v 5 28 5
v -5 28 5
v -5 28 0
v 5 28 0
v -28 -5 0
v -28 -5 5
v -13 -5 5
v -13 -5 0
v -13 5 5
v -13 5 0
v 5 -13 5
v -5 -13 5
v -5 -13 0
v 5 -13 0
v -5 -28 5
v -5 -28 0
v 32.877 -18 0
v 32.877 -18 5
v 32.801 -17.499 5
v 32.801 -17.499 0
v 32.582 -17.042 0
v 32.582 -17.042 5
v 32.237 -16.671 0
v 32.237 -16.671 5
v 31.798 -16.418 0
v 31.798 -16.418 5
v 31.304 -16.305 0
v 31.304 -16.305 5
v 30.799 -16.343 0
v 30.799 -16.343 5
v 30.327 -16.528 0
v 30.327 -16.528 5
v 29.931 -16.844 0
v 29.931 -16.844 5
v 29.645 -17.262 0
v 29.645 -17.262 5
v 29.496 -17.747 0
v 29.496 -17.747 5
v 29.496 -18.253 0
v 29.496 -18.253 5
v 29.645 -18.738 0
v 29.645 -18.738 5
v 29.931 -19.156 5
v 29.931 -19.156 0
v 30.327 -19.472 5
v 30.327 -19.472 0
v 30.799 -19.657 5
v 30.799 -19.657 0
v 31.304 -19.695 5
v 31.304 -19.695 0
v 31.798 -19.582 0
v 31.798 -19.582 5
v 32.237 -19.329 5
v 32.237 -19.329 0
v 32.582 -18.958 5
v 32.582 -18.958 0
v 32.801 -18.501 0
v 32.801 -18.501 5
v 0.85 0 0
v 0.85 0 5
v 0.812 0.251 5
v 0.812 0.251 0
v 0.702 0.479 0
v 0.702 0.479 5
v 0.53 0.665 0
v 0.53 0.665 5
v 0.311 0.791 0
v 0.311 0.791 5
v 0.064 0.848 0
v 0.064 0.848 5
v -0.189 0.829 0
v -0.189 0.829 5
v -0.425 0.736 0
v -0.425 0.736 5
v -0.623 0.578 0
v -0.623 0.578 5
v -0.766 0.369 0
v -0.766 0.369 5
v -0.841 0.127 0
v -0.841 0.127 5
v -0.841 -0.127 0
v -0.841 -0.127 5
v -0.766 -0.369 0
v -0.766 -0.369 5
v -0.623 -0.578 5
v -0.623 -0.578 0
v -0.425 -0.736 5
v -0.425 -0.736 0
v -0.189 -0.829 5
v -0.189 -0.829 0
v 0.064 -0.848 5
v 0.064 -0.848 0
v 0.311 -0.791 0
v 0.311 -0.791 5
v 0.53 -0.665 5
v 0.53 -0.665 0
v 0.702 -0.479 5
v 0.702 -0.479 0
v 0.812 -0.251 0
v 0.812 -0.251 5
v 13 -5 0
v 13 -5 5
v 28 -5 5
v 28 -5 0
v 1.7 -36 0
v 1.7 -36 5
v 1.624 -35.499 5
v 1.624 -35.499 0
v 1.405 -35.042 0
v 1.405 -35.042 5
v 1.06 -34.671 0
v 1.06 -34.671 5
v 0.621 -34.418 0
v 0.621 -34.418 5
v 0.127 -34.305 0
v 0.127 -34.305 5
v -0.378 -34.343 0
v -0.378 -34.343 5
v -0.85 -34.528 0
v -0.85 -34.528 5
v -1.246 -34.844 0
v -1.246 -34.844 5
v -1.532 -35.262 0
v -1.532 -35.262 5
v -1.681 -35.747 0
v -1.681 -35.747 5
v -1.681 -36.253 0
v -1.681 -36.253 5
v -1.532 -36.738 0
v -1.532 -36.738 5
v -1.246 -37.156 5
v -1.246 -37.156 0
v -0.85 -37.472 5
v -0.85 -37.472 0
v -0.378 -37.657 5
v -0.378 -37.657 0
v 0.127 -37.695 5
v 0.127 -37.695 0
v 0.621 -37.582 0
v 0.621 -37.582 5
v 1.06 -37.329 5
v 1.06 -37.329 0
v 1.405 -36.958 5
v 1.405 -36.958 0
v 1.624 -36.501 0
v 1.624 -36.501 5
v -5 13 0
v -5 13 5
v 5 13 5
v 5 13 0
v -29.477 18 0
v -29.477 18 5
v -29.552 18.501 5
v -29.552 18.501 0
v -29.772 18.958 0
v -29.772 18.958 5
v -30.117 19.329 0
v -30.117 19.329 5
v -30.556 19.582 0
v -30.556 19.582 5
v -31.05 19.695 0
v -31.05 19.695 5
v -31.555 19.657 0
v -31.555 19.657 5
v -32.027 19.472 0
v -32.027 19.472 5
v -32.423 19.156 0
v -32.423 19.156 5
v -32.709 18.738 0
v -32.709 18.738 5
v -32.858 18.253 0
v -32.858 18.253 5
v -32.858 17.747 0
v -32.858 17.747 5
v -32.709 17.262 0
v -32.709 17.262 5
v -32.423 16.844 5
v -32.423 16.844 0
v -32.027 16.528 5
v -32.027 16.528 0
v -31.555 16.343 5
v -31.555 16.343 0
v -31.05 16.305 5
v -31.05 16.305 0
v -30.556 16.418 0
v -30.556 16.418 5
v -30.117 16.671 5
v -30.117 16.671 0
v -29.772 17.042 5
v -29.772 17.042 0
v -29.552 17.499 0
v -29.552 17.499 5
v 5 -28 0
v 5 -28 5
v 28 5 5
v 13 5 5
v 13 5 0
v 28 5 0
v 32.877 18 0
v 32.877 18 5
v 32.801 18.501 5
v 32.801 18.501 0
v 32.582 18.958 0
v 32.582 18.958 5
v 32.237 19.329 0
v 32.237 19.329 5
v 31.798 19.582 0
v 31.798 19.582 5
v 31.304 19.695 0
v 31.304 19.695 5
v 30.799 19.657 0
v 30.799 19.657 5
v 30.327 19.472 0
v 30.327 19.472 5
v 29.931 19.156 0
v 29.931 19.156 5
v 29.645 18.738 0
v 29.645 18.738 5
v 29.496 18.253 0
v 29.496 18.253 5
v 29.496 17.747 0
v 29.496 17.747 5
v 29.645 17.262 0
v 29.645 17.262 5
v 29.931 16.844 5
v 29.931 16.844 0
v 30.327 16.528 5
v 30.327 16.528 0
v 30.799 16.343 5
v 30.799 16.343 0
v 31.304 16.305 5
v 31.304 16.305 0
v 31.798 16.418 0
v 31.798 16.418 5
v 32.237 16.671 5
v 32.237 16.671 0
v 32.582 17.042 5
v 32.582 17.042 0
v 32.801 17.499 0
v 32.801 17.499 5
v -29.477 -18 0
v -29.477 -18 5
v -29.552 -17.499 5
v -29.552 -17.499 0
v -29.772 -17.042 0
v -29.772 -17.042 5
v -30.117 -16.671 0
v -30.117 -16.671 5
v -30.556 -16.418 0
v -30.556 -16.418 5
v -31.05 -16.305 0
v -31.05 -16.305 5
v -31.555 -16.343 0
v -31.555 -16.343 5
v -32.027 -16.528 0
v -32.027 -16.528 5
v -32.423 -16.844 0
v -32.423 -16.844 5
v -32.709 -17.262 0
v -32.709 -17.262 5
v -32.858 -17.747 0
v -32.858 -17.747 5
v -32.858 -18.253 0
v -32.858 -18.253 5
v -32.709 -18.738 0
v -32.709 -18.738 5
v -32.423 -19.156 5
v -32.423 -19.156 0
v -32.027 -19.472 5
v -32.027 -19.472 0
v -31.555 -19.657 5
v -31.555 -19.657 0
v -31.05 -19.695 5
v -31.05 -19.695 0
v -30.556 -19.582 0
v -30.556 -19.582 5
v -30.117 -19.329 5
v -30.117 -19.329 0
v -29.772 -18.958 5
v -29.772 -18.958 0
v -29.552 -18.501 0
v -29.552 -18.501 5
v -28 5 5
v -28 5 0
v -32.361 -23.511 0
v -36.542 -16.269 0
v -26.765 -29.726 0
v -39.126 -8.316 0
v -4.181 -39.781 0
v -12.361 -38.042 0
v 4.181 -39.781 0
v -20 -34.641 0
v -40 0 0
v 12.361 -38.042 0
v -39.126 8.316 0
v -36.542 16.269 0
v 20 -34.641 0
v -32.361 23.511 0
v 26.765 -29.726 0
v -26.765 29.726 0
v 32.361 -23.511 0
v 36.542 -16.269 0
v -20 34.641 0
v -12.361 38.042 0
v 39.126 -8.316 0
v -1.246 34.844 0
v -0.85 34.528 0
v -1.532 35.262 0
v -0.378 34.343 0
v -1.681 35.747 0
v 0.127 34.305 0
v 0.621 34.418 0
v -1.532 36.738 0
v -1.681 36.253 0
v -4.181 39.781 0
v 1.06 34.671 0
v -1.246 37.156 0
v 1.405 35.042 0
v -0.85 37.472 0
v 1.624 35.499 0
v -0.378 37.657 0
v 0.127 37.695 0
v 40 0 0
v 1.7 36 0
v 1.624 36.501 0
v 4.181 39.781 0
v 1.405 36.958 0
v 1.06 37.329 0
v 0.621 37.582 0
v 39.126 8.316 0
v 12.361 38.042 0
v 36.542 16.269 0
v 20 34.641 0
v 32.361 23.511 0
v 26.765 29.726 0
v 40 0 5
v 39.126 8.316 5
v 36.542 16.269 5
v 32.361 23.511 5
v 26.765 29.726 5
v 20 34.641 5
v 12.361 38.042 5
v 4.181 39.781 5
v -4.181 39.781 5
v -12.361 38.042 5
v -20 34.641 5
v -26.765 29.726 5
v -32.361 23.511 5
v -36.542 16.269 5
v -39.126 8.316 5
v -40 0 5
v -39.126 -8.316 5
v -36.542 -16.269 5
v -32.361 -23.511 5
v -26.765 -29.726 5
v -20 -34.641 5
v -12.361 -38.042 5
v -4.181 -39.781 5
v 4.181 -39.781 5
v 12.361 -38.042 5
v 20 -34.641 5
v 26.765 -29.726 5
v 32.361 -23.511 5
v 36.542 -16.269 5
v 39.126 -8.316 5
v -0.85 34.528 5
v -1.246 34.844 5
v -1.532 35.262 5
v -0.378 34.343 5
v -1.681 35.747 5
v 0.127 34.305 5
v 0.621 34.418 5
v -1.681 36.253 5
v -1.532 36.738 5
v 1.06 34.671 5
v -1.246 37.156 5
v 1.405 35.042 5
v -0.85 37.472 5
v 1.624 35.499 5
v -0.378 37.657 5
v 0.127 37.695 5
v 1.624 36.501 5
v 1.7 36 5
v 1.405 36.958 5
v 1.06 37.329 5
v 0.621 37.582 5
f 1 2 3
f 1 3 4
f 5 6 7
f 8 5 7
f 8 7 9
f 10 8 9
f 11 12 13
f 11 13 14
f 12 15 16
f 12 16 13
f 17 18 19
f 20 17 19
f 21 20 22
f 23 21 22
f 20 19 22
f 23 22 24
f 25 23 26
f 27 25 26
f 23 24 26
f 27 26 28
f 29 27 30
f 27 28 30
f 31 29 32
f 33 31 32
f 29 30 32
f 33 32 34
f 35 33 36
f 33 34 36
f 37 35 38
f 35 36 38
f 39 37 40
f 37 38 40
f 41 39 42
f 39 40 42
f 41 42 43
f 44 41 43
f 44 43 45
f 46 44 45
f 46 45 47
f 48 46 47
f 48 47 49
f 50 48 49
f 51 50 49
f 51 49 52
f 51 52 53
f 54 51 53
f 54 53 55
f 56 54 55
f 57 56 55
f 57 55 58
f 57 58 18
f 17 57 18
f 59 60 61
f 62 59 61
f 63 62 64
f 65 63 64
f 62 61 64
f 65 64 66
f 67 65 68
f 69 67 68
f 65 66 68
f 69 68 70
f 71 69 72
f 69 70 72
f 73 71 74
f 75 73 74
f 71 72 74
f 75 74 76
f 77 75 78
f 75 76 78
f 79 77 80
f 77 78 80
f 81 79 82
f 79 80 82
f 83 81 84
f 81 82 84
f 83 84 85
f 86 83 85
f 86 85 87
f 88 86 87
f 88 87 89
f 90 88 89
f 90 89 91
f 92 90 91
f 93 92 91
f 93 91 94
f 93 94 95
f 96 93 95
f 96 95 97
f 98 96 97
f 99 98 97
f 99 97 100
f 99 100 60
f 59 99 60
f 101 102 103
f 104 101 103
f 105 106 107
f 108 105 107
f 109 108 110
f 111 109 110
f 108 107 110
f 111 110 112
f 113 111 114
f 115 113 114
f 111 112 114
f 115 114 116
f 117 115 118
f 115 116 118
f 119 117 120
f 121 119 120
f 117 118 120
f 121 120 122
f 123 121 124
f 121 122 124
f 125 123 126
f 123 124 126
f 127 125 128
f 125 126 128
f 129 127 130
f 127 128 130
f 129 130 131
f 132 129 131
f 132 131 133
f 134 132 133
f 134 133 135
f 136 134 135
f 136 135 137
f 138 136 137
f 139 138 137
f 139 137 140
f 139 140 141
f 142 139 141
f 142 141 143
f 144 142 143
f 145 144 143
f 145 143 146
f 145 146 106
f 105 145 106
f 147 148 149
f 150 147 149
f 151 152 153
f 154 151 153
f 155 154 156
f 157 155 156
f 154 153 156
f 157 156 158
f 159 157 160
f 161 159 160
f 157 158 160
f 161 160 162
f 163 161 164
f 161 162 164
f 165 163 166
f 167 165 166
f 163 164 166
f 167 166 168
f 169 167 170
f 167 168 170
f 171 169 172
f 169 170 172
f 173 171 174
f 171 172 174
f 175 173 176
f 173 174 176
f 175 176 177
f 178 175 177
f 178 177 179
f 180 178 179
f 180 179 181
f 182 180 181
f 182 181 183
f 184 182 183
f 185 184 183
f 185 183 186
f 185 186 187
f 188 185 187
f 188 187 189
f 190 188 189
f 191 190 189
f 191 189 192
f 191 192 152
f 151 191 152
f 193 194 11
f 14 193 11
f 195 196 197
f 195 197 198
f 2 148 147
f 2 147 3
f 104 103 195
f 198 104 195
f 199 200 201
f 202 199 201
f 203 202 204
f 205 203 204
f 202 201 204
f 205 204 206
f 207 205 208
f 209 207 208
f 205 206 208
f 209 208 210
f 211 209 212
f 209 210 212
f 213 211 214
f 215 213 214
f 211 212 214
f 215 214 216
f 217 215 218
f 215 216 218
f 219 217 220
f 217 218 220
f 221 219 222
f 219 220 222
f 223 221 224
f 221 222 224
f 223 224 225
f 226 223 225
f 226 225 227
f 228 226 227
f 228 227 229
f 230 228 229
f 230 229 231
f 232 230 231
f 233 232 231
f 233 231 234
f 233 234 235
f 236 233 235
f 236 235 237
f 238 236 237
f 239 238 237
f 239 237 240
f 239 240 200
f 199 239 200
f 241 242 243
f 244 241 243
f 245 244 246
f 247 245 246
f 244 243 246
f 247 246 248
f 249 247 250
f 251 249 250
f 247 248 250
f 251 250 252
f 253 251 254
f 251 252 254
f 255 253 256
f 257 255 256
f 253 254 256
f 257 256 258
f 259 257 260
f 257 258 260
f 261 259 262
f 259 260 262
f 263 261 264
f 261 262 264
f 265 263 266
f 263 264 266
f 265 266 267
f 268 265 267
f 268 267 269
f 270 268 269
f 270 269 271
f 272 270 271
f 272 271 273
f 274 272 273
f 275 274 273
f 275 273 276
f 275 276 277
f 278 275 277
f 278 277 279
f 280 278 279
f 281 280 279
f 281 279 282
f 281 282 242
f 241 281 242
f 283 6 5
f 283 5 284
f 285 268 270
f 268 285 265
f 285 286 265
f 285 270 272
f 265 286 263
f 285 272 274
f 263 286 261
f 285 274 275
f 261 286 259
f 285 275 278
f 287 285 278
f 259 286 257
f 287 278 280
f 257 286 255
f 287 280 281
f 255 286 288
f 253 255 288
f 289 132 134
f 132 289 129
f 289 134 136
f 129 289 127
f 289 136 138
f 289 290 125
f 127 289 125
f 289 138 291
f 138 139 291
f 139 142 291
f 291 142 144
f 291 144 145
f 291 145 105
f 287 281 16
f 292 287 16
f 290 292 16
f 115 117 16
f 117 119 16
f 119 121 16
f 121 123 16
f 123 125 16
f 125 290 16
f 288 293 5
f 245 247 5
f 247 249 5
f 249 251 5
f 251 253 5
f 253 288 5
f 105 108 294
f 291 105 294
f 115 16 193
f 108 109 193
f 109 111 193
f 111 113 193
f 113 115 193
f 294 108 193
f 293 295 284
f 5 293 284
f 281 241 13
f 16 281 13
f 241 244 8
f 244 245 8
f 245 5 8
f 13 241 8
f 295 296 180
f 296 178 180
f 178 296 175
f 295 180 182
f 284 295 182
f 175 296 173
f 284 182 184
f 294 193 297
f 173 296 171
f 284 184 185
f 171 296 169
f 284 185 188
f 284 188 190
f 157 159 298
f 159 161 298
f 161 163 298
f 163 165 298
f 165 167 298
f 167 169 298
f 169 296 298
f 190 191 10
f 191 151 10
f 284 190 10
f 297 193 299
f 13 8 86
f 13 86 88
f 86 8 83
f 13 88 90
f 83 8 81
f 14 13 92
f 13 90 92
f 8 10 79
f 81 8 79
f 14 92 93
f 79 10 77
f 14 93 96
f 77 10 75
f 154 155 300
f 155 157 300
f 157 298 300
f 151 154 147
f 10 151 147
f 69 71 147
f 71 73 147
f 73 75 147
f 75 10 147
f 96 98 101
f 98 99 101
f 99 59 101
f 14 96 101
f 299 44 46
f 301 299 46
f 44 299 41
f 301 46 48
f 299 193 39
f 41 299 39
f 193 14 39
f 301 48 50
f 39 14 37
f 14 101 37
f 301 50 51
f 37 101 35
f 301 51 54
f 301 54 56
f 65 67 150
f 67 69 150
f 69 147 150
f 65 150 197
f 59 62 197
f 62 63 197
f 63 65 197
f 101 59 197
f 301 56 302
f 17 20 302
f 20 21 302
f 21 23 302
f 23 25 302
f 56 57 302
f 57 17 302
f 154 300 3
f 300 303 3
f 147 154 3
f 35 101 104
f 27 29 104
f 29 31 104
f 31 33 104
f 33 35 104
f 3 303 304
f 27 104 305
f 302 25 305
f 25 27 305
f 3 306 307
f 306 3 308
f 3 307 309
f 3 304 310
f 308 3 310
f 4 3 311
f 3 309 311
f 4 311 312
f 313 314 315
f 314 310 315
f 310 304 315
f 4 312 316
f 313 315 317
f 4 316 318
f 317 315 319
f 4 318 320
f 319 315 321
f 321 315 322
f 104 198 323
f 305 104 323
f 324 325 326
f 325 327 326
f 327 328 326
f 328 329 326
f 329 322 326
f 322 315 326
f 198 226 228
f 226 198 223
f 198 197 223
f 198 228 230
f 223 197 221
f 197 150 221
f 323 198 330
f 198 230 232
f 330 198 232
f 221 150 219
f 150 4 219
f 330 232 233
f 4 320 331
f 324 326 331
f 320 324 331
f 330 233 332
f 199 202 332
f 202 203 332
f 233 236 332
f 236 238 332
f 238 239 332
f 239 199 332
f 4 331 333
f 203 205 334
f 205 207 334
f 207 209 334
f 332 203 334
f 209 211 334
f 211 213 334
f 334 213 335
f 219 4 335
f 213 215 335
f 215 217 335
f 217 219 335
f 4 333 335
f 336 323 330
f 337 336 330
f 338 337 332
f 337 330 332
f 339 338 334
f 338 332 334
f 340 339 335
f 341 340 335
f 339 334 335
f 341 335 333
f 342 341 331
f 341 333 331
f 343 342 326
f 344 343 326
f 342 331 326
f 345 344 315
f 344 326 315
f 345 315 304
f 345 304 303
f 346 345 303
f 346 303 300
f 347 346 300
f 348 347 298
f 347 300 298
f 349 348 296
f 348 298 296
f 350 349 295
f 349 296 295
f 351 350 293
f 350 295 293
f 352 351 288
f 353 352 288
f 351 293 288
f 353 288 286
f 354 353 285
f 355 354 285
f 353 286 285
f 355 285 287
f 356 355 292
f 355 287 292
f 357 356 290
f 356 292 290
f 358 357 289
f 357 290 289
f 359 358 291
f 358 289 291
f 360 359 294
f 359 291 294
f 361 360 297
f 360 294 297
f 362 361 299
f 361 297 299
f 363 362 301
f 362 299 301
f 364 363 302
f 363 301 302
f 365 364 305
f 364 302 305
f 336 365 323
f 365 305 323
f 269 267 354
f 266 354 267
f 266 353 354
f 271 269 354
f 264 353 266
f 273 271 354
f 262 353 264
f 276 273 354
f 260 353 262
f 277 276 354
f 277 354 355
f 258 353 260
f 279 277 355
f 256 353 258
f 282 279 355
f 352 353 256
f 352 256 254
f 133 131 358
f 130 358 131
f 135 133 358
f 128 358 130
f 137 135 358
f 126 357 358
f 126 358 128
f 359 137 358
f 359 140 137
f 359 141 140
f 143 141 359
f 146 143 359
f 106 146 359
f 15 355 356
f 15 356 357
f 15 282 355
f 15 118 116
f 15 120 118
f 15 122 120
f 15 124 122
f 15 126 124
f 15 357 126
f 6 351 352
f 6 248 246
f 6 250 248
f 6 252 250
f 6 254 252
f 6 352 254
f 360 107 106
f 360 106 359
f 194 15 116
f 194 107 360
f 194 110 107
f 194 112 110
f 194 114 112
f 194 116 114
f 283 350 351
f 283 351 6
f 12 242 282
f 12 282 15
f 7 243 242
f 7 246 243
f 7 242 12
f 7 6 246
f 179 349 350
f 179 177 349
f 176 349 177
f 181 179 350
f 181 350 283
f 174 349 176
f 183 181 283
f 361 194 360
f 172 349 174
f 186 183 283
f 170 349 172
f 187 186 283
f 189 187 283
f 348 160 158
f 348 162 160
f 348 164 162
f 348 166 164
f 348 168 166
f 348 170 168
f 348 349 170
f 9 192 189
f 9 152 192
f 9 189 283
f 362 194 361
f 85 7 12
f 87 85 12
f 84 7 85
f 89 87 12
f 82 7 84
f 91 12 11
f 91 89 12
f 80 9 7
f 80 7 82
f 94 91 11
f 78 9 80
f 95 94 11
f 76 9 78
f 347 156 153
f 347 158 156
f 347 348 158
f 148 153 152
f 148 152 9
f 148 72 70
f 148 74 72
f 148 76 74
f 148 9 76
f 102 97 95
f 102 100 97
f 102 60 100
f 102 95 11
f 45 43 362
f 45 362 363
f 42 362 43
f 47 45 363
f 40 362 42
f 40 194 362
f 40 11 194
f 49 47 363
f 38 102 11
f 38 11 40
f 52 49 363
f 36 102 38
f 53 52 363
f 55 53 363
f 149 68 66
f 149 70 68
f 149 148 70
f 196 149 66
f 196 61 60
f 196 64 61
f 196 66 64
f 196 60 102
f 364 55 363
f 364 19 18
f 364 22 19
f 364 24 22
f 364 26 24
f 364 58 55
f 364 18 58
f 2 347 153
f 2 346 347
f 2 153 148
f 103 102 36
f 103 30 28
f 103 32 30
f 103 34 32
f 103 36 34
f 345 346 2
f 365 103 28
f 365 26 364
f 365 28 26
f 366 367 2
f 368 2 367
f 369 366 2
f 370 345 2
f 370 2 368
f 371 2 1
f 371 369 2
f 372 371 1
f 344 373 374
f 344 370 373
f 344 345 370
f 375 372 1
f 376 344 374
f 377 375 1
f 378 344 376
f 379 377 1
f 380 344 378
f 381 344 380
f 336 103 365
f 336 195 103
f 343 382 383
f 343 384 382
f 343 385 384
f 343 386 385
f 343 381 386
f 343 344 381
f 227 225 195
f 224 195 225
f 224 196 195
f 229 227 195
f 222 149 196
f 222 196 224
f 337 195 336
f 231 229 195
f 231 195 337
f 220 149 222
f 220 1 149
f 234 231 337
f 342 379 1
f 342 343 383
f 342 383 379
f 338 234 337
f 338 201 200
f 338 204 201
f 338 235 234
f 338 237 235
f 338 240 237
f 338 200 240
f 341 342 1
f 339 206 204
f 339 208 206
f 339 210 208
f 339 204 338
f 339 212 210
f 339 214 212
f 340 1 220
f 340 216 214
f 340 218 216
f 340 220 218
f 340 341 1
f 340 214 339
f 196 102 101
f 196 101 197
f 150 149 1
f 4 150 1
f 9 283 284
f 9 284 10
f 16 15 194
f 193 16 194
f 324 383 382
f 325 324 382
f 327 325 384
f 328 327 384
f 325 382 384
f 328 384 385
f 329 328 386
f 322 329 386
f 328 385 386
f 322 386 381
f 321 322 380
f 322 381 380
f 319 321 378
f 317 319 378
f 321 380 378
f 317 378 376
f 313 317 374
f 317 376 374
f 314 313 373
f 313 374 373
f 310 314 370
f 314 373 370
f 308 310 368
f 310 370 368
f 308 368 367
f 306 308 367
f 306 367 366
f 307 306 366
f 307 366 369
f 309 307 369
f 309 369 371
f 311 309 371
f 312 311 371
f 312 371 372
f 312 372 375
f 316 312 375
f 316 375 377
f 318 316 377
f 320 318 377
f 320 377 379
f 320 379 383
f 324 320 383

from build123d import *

# Parameters (mm, degrees)
SKETCH1_R           = 40
SKETCH1_R_2         = 0.75
BOSS_EXTRUDE1_DEPTH = 5
SKETCH4_W           = 10
SKETCH4_H           = 15
SKETCH4_W_2         = 15
SKETCH4_H_2         = 10
CUT_EXTRUDE3_DEPTH  = 6
SKETCH5_R           = 1.7
CUT_EXTRUDE4_DEPTH  = 6
SKETCH6_R           = 0.85
CUT_EXTRUDE5_DEPTH  = 6


with BuildPart() as part:
    # Sketch1 → Boss-Extrude1 (new body)
    with BuildSketch(Plane.XY):
        Circle(SKETCH1_R)
        Circle(SKETCH1_R_2, mode=Mode.SUBTRACT)
    extrude(amount=BOSS_EXTRUDE1_DEPTH)

    # Sketch4 → Cut-Extrude3 (cut, through all)
    with BuildSketch(Plane.XY.offset(5)):
        with Locations((0, 20.5)):
            Rectangle(SKETCH4_W, SKETCH4_H)
        with Locations((20.5, 0)):
            Rectangle(SKETCH4_W_2, SKETCH4_H_2)
        with Locations((0, -20.5)):
            Rectangle(SKETCH4_W, SKETCH4_H)
        with Locations((-20.5, 0)):
            Rectangle(SKETCH4_W_2, SKETCH4_H_2)
    extrude(amount=-CUT_EXTRUDE3_DEPTH, mode=Mode.SUBTRACT)

    # Sketch5 → Cut-Extrude4 (cut, through all)
    with BuildSketch(Plane.XY.offset(5)):
        with Locations((0, 36)):
            Circle(SKETCH5_R)
        with Locations((31.176914536, 18)):
            Circle(SKETCH5_R)
        with Locations((31.176914536, -18)):
            Circle(SKETCH5_R)
        with Locations((0, -36)):
            Circle(SKETCH5_R)
        with Locations((-31.176914536, -18)):
            Circle(SKETCH5_R)
        with Locations((-31.176914536, 18)):
            Circle(SKETCH5_R)
    extrude(amount=-CUT_EXTRUDE4_DEPTH, mode=Mode.SUBTRACT)

    # Sketch6 → Cut-Extrude5 (cut, through all)
    with BuildSketch(Plane.XY.offset(5)):
        Circle(SKETCH6_R)
    extrude(amount=-CUT_EXTRUDE5_DEPTH, mode=Mode.SUBTRACT)


solid = part.part
